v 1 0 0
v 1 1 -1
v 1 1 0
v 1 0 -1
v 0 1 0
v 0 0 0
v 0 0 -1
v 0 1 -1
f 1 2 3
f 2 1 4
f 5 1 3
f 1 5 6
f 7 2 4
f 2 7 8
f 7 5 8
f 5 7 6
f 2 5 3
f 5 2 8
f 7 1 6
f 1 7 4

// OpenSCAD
union(){
     translate([0,0.0,-1.0]){ cube([1,1,1]);}
     translate([0,0.0,-1.0]){ cube([1,1,1]);}
     }
